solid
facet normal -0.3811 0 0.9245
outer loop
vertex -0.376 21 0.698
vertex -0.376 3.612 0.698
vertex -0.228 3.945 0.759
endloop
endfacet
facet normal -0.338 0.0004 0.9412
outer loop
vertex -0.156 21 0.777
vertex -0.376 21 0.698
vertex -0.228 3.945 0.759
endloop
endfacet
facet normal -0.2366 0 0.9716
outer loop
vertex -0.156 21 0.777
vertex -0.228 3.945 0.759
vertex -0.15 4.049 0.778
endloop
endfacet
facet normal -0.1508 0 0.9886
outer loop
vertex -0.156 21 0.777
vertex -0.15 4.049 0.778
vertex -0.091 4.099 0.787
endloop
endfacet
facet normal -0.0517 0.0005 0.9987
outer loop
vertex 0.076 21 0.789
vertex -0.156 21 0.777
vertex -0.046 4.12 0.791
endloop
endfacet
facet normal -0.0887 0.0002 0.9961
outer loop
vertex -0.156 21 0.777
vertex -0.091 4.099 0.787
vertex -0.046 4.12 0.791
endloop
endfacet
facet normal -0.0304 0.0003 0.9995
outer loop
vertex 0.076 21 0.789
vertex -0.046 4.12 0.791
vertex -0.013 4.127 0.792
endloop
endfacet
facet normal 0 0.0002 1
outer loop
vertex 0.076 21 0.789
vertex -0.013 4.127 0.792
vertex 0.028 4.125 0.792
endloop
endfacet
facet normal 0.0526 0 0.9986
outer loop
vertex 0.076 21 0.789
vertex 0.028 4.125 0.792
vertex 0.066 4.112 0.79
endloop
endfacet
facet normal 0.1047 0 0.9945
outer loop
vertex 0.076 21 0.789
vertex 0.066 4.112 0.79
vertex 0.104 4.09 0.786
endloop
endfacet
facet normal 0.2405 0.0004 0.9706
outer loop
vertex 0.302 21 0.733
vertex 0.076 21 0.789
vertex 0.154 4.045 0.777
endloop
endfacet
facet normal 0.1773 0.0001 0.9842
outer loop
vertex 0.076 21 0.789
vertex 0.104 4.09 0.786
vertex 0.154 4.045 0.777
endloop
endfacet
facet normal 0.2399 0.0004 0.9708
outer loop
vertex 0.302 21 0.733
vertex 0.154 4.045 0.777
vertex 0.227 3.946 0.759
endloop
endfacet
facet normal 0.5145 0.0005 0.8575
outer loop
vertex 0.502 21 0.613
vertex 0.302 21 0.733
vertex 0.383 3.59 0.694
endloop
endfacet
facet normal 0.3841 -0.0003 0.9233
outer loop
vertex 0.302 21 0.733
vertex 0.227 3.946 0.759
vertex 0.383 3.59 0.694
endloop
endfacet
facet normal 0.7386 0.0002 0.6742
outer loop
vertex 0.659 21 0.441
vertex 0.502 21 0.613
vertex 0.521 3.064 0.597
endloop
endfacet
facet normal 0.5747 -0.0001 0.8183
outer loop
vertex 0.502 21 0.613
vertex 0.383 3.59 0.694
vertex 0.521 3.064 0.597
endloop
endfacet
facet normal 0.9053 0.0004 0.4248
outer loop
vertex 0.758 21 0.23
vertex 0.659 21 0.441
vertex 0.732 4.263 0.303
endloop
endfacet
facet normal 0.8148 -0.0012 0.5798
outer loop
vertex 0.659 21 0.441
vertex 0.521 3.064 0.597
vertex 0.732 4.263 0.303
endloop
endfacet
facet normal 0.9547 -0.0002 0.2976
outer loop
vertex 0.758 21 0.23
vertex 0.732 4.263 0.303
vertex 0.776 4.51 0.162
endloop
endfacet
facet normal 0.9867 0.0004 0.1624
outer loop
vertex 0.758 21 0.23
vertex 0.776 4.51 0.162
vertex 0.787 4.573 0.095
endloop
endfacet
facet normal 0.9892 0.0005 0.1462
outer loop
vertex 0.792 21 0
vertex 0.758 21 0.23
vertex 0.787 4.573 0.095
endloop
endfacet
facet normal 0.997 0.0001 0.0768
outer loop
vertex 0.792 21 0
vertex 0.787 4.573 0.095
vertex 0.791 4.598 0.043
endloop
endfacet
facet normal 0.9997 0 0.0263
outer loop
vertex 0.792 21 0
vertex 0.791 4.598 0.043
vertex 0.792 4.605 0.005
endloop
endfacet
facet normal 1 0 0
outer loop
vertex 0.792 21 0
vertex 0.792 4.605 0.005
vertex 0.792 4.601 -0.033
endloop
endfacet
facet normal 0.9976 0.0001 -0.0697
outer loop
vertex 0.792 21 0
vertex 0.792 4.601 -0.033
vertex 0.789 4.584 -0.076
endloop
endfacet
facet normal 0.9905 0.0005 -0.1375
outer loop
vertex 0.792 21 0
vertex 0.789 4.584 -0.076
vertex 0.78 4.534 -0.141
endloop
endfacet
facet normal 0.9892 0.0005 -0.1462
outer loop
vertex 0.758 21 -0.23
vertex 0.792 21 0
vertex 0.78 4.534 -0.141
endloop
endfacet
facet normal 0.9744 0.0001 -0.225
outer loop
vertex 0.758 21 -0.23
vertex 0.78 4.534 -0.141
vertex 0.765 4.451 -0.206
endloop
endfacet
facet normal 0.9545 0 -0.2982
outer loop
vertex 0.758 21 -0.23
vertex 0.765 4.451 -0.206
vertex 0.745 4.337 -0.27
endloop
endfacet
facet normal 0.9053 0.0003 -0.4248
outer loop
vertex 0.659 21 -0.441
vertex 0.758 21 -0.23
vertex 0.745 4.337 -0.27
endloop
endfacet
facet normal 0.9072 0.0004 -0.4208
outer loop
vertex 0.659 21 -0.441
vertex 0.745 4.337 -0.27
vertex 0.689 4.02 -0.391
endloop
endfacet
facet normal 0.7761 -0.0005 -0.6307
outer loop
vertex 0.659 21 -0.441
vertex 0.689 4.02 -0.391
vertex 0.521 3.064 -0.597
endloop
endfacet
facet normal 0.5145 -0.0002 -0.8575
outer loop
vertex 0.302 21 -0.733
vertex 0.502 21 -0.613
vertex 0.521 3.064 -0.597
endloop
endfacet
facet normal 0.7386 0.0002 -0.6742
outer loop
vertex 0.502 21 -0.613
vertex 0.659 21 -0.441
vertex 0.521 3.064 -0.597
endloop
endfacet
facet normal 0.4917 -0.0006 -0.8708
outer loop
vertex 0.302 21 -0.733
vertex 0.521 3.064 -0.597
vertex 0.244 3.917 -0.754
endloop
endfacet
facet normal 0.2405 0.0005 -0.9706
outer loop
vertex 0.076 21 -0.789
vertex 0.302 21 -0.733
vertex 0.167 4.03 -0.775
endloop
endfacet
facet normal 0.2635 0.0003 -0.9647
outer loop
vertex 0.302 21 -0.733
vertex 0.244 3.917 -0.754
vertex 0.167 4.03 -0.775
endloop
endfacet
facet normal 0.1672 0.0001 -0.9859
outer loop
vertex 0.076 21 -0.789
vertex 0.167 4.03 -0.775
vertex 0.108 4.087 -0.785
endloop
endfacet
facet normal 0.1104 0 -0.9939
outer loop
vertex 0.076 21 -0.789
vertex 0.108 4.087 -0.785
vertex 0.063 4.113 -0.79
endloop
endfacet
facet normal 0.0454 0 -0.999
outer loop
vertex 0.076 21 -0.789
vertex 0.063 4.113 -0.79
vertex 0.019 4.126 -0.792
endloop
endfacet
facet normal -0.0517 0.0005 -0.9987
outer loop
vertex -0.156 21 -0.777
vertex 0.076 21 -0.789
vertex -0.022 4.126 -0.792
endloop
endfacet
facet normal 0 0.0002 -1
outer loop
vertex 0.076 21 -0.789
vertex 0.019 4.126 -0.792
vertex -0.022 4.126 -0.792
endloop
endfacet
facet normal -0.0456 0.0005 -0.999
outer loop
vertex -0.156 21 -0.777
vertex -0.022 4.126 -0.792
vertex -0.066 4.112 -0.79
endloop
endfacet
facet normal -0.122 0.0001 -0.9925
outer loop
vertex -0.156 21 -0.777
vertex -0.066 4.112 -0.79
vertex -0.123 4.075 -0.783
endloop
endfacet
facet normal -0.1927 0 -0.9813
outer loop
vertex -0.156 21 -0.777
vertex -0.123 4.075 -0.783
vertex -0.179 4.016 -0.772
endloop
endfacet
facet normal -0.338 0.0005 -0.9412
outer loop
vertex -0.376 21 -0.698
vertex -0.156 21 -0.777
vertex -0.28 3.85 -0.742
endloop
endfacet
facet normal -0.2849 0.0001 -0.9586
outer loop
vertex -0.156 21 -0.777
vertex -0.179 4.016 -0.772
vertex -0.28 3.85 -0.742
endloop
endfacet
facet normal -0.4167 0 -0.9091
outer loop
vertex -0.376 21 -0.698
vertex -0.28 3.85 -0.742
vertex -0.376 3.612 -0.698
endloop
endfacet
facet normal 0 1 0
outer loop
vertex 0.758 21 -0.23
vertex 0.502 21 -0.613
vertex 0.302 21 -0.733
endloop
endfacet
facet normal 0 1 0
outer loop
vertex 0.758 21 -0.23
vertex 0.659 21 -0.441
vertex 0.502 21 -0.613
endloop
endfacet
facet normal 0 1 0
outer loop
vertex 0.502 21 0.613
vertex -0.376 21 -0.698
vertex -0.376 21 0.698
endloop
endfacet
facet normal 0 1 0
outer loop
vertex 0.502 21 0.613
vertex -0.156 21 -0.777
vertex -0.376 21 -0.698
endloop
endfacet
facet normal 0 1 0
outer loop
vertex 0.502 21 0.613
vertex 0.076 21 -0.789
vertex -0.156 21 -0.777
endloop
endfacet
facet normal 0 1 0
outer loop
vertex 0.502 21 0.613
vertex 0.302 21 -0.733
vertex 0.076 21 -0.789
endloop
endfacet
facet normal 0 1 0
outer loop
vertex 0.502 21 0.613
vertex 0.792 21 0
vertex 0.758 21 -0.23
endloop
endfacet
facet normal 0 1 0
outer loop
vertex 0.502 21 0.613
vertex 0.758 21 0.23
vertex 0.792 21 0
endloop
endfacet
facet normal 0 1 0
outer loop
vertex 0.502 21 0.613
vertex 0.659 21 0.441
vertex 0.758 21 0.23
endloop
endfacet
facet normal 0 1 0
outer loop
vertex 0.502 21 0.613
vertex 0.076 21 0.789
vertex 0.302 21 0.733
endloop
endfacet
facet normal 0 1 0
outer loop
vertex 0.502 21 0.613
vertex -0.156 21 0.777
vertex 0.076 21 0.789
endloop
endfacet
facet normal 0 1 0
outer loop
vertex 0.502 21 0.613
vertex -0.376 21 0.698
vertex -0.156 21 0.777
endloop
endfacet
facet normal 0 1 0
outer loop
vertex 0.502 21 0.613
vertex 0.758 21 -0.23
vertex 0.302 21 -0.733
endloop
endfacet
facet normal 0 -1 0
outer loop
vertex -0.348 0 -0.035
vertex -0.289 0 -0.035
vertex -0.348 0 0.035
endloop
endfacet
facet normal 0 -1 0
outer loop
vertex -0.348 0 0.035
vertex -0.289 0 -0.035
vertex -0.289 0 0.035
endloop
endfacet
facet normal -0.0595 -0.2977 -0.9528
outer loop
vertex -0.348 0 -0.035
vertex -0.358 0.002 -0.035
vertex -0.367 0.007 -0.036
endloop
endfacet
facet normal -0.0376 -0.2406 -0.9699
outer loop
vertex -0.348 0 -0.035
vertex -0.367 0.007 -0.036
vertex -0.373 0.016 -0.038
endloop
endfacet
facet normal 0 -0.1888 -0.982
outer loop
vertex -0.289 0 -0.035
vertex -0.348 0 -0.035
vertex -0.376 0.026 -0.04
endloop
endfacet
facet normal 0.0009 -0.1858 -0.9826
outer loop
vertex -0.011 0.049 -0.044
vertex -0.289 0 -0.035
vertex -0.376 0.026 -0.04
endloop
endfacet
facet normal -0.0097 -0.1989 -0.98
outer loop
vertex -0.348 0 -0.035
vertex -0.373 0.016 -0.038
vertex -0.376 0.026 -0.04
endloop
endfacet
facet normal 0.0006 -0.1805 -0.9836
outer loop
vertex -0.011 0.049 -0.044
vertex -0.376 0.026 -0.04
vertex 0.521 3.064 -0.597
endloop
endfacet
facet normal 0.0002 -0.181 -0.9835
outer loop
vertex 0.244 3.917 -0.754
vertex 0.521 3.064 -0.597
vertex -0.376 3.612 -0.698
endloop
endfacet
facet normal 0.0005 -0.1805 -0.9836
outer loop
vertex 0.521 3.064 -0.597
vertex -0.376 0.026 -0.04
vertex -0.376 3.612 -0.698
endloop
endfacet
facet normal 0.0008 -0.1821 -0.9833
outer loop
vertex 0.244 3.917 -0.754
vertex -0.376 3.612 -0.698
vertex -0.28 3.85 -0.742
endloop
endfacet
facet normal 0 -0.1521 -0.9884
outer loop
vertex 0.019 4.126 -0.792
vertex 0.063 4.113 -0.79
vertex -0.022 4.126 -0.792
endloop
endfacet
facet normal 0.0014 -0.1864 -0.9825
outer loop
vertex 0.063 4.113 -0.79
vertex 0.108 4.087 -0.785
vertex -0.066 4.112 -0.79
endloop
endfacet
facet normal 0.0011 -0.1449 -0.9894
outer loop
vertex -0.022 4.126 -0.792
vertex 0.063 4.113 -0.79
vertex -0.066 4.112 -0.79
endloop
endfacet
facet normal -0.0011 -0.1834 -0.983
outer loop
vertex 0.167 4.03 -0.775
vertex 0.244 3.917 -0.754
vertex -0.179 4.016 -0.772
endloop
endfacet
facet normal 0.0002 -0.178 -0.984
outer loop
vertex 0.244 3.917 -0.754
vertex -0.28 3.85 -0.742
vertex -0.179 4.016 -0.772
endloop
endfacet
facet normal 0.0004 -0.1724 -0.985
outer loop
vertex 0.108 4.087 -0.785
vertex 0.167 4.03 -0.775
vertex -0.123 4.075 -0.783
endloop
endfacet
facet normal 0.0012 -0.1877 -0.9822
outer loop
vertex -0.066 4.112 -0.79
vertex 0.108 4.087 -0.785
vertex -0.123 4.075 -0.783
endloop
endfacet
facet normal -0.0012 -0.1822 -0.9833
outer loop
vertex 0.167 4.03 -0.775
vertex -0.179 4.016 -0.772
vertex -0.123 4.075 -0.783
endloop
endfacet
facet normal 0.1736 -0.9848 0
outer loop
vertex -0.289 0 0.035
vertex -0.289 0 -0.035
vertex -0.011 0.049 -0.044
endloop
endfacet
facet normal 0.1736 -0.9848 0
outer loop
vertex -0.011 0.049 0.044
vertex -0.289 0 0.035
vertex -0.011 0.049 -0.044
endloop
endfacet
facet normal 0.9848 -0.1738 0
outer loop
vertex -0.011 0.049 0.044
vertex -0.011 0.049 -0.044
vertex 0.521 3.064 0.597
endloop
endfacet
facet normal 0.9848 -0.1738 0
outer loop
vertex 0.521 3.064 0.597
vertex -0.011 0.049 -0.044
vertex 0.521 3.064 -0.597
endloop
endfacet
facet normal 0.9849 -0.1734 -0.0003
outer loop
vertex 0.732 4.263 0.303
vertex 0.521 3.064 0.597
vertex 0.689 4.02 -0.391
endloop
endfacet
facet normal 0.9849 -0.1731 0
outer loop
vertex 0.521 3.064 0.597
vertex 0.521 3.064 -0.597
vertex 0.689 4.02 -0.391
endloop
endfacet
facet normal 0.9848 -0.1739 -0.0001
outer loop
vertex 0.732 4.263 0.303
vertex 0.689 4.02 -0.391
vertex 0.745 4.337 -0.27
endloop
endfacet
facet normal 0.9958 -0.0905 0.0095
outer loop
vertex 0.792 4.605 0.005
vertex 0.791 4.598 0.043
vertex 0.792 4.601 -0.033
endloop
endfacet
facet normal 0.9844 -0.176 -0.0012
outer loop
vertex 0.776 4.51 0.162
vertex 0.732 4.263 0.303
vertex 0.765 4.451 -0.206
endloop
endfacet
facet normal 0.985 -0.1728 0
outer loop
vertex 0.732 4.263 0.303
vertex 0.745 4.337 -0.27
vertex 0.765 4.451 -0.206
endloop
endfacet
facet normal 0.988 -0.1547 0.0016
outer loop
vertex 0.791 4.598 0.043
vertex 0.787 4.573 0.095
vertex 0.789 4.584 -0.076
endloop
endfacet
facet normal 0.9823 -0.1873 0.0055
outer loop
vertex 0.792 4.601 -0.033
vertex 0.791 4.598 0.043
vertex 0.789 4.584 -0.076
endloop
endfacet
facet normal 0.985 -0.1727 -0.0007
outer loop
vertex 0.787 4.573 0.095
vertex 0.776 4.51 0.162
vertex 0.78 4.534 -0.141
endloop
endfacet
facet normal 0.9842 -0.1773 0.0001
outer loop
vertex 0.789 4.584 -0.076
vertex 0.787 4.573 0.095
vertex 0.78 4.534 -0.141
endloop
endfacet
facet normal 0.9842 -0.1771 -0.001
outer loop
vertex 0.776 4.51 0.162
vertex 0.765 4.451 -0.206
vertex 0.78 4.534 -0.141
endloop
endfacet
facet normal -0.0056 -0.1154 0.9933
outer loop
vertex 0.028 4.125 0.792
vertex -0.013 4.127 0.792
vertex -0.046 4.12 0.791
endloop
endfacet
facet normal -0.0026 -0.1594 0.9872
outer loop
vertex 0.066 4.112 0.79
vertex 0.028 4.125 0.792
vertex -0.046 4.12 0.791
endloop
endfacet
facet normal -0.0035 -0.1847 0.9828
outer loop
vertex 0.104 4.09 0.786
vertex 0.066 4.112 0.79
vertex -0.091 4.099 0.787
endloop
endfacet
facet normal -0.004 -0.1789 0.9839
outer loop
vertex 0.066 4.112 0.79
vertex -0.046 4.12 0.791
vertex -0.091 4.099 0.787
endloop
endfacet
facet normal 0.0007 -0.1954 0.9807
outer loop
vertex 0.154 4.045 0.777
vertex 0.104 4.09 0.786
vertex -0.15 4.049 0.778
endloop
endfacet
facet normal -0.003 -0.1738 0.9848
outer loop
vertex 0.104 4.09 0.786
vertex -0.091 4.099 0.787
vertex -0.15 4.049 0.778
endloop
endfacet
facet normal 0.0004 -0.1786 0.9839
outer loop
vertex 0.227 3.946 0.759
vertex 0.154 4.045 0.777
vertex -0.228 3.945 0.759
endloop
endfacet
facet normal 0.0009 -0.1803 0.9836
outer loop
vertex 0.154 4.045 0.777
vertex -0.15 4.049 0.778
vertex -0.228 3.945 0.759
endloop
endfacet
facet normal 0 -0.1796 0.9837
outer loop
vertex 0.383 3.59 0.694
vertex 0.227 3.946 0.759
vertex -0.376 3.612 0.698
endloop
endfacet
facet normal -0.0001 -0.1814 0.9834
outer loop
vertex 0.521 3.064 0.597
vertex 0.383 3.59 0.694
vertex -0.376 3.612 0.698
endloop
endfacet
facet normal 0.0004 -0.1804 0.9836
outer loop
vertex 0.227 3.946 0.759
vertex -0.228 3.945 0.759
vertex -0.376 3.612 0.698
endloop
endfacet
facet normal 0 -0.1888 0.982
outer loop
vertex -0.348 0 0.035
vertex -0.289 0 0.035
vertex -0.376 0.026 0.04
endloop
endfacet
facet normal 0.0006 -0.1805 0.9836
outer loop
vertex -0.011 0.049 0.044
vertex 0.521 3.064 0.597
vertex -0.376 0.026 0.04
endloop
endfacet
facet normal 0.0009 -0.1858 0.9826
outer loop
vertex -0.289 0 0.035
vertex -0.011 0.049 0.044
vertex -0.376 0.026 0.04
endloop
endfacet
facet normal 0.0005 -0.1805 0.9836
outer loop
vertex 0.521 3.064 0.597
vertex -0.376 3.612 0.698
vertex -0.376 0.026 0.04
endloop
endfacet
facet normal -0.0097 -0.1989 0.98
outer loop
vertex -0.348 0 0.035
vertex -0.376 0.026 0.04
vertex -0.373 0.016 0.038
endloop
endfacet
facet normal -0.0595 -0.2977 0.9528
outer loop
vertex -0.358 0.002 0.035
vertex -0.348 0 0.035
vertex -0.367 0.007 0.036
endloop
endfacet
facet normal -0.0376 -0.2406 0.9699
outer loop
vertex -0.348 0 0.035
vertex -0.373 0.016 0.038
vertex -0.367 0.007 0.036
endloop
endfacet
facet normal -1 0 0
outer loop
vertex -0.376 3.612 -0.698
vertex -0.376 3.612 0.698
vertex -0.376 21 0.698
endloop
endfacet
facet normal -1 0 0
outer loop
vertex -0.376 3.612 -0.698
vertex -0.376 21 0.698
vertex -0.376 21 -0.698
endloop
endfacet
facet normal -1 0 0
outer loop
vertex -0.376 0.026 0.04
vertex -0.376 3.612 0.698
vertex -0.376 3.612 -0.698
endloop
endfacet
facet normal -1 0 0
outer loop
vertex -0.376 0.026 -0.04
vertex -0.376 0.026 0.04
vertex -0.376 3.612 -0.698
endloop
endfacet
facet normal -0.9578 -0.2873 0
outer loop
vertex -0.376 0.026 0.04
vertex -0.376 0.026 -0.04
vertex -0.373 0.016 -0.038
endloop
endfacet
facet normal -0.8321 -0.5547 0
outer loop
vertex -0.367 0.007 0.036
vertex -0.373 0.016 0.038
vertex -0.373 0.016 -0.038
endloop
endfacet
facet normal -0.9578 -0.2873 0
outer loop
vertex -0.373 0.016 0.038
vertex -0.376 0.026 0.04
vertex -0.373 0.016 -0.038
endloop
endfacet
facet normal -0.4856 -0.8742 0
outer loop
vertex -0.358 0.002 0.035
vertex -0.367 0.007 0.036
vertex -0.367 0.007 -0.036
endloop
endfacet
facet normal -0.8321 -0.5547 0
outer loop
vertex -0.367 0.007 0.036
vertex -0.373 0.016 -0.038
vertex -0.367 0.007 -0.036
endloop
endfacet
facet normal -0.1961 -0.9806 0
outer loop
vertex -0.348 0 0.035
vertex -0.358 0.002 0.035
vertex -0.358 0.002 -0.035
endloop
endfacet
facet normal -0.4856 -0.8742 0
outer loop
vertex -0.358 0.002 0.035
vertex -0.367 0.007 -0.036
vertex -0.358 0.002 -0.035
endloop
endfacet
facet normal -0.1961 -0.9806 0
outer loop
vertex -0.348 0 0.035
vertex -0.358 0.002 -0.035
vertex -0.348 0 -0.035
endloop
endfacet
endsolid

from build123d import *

# Parameters (mm, degrees)
TD_SKETCH_R                   = 0.792499939
TL_FEATURE_DEPTH              = 20.99999991
TDF_STD_SKETCH_W              = 1.604999838
TDF_STD_SKETCH_H              = 1.604999838
TDF_STD_FEATURE_DEPTH         = 22.02988608
ISA_20_STD_FEATURE_DEPTH      = 22.02988608
ISA_20_STD_FEATURE_DEPTH_BACK = 22.02988608
F_10BA_STD_FEATURE_DEPTH      = 22.02988608
F_10BA_STD_FEATURE_DEPTH_BACK = 22.02988608
FRO_STD_FEATURE_DEPTH         = 22.02988608
FRO_STD_FEATURE_DEPTH_BACK    = 22.02988608


with BuildPart() as part:
    # TD_sketch → TL_feature (new body)
    with BuildSketch(Plane(origin=(0, 0, 0), x_dir=(1, 0, 0), z_dir=(0, 1, 0))):
        Circle(TD_SKETCH_R)
    extrude(amount=TL_FEATURE_DEPTH)

    # TDF_STD_sketch → TDF_STD_feature (cut, through all)
    with BuildSketch(Plane(origin=(0, 0, 0), x_dir=(1, 0, 0), z_dir=(0, 1, 0))):
        with Locations((-1.17799993, 0)):
            Rectangle(TDF_STD_SKETCH_W, TDF_STD_SKETCH_H)
    extrude(amount=TDF_STD_FEATURE_DEPTH, mode=Mode.SUBTRACT)

    # ISA_20_STD_sketch → ISA_20_STD_feature (cut, two sides: drawn at the far end of the back side and taken through both)
    with BuildSketch(Plane(origin=(0, 0, 0), x_dir=(0, 0, -1), z_dir=(1, 0, 0)).offset(-ISA_20_STD_FEATURE_DEPTH_BACK)):
        Polygon((-13.462346915, 73.159859471), (-3.889221277, 20.99999991), (-0.035000057, 0), (0.035000057, 0), (3.889221277, 20.99999991), (13.462346915, 73.159859471), (13.462346915, -32.902305016), (-13.462346915, -32.902305016), align=None)
    extrude(amount=ISA_20_STD_FEATURE_DEPTH + ISA_20_STD_FEATURE_DEPTH_BACK, mode=Mode.SUBTRACT)

    # 10BA_STD_sketch → 10BA_STD_feature (cut, two sides: drawn at the far end of the back side and taken through both)
    with BuildSketch(Plane.XY.offset(-F_10BA_STD_FEATURE_DEPTH_BACK)):
        Polygon((-53.152802148, 0), (-0.375500011, 0), (-0.289499929, 0), (-0.010835963, 0.049135976), (3.683366618, 20.99999991), (12.848048956, 72.975496238), (91.13369141, 2.172017021), (25.132840305, -70.803479216), align=None)
    extrude(amount=F_10BA_STD_FEATURE_DEPTH + F_10BA_STD_FEATURE_DEPTH_BACK, mode=Mode.SUBTRACT)

    # FRO_STD_sketch → FRO_STD_feature (cut, two sides: drawn at the far end of the back side and taken through both)
    with BuildSketch(Plane.XY.offset(-FRO_STD_FEATURE_DEPTH_BACK)):
        with BuildLine():
            Line((-0.375601611, 52.089797523), (-0.375601611, 0.02794))
            ThreePointArc((-0.375601611, 0.02794), (-0.367418174, 0.008183437), (-0.347661611, 0))
            Line((-0.347661611, 0), (51.714195912, 0))
            Line((51.714195912, 0), (-21.91238908, -73.626584992))
            Line((-21.91238908, -73.626584992), (-74.002186603, -21.536787469))
            Line((-74.002186603, -21.536787469), (-0.375601611, 52.089797523))
        make_face()
    extrude(amount=FRO_STD_FEATURE_DEPTH + FRO_STD_FEATURE_DEPTH_BACK, mode=Mode.SUBTRACT)


solid = part.part
